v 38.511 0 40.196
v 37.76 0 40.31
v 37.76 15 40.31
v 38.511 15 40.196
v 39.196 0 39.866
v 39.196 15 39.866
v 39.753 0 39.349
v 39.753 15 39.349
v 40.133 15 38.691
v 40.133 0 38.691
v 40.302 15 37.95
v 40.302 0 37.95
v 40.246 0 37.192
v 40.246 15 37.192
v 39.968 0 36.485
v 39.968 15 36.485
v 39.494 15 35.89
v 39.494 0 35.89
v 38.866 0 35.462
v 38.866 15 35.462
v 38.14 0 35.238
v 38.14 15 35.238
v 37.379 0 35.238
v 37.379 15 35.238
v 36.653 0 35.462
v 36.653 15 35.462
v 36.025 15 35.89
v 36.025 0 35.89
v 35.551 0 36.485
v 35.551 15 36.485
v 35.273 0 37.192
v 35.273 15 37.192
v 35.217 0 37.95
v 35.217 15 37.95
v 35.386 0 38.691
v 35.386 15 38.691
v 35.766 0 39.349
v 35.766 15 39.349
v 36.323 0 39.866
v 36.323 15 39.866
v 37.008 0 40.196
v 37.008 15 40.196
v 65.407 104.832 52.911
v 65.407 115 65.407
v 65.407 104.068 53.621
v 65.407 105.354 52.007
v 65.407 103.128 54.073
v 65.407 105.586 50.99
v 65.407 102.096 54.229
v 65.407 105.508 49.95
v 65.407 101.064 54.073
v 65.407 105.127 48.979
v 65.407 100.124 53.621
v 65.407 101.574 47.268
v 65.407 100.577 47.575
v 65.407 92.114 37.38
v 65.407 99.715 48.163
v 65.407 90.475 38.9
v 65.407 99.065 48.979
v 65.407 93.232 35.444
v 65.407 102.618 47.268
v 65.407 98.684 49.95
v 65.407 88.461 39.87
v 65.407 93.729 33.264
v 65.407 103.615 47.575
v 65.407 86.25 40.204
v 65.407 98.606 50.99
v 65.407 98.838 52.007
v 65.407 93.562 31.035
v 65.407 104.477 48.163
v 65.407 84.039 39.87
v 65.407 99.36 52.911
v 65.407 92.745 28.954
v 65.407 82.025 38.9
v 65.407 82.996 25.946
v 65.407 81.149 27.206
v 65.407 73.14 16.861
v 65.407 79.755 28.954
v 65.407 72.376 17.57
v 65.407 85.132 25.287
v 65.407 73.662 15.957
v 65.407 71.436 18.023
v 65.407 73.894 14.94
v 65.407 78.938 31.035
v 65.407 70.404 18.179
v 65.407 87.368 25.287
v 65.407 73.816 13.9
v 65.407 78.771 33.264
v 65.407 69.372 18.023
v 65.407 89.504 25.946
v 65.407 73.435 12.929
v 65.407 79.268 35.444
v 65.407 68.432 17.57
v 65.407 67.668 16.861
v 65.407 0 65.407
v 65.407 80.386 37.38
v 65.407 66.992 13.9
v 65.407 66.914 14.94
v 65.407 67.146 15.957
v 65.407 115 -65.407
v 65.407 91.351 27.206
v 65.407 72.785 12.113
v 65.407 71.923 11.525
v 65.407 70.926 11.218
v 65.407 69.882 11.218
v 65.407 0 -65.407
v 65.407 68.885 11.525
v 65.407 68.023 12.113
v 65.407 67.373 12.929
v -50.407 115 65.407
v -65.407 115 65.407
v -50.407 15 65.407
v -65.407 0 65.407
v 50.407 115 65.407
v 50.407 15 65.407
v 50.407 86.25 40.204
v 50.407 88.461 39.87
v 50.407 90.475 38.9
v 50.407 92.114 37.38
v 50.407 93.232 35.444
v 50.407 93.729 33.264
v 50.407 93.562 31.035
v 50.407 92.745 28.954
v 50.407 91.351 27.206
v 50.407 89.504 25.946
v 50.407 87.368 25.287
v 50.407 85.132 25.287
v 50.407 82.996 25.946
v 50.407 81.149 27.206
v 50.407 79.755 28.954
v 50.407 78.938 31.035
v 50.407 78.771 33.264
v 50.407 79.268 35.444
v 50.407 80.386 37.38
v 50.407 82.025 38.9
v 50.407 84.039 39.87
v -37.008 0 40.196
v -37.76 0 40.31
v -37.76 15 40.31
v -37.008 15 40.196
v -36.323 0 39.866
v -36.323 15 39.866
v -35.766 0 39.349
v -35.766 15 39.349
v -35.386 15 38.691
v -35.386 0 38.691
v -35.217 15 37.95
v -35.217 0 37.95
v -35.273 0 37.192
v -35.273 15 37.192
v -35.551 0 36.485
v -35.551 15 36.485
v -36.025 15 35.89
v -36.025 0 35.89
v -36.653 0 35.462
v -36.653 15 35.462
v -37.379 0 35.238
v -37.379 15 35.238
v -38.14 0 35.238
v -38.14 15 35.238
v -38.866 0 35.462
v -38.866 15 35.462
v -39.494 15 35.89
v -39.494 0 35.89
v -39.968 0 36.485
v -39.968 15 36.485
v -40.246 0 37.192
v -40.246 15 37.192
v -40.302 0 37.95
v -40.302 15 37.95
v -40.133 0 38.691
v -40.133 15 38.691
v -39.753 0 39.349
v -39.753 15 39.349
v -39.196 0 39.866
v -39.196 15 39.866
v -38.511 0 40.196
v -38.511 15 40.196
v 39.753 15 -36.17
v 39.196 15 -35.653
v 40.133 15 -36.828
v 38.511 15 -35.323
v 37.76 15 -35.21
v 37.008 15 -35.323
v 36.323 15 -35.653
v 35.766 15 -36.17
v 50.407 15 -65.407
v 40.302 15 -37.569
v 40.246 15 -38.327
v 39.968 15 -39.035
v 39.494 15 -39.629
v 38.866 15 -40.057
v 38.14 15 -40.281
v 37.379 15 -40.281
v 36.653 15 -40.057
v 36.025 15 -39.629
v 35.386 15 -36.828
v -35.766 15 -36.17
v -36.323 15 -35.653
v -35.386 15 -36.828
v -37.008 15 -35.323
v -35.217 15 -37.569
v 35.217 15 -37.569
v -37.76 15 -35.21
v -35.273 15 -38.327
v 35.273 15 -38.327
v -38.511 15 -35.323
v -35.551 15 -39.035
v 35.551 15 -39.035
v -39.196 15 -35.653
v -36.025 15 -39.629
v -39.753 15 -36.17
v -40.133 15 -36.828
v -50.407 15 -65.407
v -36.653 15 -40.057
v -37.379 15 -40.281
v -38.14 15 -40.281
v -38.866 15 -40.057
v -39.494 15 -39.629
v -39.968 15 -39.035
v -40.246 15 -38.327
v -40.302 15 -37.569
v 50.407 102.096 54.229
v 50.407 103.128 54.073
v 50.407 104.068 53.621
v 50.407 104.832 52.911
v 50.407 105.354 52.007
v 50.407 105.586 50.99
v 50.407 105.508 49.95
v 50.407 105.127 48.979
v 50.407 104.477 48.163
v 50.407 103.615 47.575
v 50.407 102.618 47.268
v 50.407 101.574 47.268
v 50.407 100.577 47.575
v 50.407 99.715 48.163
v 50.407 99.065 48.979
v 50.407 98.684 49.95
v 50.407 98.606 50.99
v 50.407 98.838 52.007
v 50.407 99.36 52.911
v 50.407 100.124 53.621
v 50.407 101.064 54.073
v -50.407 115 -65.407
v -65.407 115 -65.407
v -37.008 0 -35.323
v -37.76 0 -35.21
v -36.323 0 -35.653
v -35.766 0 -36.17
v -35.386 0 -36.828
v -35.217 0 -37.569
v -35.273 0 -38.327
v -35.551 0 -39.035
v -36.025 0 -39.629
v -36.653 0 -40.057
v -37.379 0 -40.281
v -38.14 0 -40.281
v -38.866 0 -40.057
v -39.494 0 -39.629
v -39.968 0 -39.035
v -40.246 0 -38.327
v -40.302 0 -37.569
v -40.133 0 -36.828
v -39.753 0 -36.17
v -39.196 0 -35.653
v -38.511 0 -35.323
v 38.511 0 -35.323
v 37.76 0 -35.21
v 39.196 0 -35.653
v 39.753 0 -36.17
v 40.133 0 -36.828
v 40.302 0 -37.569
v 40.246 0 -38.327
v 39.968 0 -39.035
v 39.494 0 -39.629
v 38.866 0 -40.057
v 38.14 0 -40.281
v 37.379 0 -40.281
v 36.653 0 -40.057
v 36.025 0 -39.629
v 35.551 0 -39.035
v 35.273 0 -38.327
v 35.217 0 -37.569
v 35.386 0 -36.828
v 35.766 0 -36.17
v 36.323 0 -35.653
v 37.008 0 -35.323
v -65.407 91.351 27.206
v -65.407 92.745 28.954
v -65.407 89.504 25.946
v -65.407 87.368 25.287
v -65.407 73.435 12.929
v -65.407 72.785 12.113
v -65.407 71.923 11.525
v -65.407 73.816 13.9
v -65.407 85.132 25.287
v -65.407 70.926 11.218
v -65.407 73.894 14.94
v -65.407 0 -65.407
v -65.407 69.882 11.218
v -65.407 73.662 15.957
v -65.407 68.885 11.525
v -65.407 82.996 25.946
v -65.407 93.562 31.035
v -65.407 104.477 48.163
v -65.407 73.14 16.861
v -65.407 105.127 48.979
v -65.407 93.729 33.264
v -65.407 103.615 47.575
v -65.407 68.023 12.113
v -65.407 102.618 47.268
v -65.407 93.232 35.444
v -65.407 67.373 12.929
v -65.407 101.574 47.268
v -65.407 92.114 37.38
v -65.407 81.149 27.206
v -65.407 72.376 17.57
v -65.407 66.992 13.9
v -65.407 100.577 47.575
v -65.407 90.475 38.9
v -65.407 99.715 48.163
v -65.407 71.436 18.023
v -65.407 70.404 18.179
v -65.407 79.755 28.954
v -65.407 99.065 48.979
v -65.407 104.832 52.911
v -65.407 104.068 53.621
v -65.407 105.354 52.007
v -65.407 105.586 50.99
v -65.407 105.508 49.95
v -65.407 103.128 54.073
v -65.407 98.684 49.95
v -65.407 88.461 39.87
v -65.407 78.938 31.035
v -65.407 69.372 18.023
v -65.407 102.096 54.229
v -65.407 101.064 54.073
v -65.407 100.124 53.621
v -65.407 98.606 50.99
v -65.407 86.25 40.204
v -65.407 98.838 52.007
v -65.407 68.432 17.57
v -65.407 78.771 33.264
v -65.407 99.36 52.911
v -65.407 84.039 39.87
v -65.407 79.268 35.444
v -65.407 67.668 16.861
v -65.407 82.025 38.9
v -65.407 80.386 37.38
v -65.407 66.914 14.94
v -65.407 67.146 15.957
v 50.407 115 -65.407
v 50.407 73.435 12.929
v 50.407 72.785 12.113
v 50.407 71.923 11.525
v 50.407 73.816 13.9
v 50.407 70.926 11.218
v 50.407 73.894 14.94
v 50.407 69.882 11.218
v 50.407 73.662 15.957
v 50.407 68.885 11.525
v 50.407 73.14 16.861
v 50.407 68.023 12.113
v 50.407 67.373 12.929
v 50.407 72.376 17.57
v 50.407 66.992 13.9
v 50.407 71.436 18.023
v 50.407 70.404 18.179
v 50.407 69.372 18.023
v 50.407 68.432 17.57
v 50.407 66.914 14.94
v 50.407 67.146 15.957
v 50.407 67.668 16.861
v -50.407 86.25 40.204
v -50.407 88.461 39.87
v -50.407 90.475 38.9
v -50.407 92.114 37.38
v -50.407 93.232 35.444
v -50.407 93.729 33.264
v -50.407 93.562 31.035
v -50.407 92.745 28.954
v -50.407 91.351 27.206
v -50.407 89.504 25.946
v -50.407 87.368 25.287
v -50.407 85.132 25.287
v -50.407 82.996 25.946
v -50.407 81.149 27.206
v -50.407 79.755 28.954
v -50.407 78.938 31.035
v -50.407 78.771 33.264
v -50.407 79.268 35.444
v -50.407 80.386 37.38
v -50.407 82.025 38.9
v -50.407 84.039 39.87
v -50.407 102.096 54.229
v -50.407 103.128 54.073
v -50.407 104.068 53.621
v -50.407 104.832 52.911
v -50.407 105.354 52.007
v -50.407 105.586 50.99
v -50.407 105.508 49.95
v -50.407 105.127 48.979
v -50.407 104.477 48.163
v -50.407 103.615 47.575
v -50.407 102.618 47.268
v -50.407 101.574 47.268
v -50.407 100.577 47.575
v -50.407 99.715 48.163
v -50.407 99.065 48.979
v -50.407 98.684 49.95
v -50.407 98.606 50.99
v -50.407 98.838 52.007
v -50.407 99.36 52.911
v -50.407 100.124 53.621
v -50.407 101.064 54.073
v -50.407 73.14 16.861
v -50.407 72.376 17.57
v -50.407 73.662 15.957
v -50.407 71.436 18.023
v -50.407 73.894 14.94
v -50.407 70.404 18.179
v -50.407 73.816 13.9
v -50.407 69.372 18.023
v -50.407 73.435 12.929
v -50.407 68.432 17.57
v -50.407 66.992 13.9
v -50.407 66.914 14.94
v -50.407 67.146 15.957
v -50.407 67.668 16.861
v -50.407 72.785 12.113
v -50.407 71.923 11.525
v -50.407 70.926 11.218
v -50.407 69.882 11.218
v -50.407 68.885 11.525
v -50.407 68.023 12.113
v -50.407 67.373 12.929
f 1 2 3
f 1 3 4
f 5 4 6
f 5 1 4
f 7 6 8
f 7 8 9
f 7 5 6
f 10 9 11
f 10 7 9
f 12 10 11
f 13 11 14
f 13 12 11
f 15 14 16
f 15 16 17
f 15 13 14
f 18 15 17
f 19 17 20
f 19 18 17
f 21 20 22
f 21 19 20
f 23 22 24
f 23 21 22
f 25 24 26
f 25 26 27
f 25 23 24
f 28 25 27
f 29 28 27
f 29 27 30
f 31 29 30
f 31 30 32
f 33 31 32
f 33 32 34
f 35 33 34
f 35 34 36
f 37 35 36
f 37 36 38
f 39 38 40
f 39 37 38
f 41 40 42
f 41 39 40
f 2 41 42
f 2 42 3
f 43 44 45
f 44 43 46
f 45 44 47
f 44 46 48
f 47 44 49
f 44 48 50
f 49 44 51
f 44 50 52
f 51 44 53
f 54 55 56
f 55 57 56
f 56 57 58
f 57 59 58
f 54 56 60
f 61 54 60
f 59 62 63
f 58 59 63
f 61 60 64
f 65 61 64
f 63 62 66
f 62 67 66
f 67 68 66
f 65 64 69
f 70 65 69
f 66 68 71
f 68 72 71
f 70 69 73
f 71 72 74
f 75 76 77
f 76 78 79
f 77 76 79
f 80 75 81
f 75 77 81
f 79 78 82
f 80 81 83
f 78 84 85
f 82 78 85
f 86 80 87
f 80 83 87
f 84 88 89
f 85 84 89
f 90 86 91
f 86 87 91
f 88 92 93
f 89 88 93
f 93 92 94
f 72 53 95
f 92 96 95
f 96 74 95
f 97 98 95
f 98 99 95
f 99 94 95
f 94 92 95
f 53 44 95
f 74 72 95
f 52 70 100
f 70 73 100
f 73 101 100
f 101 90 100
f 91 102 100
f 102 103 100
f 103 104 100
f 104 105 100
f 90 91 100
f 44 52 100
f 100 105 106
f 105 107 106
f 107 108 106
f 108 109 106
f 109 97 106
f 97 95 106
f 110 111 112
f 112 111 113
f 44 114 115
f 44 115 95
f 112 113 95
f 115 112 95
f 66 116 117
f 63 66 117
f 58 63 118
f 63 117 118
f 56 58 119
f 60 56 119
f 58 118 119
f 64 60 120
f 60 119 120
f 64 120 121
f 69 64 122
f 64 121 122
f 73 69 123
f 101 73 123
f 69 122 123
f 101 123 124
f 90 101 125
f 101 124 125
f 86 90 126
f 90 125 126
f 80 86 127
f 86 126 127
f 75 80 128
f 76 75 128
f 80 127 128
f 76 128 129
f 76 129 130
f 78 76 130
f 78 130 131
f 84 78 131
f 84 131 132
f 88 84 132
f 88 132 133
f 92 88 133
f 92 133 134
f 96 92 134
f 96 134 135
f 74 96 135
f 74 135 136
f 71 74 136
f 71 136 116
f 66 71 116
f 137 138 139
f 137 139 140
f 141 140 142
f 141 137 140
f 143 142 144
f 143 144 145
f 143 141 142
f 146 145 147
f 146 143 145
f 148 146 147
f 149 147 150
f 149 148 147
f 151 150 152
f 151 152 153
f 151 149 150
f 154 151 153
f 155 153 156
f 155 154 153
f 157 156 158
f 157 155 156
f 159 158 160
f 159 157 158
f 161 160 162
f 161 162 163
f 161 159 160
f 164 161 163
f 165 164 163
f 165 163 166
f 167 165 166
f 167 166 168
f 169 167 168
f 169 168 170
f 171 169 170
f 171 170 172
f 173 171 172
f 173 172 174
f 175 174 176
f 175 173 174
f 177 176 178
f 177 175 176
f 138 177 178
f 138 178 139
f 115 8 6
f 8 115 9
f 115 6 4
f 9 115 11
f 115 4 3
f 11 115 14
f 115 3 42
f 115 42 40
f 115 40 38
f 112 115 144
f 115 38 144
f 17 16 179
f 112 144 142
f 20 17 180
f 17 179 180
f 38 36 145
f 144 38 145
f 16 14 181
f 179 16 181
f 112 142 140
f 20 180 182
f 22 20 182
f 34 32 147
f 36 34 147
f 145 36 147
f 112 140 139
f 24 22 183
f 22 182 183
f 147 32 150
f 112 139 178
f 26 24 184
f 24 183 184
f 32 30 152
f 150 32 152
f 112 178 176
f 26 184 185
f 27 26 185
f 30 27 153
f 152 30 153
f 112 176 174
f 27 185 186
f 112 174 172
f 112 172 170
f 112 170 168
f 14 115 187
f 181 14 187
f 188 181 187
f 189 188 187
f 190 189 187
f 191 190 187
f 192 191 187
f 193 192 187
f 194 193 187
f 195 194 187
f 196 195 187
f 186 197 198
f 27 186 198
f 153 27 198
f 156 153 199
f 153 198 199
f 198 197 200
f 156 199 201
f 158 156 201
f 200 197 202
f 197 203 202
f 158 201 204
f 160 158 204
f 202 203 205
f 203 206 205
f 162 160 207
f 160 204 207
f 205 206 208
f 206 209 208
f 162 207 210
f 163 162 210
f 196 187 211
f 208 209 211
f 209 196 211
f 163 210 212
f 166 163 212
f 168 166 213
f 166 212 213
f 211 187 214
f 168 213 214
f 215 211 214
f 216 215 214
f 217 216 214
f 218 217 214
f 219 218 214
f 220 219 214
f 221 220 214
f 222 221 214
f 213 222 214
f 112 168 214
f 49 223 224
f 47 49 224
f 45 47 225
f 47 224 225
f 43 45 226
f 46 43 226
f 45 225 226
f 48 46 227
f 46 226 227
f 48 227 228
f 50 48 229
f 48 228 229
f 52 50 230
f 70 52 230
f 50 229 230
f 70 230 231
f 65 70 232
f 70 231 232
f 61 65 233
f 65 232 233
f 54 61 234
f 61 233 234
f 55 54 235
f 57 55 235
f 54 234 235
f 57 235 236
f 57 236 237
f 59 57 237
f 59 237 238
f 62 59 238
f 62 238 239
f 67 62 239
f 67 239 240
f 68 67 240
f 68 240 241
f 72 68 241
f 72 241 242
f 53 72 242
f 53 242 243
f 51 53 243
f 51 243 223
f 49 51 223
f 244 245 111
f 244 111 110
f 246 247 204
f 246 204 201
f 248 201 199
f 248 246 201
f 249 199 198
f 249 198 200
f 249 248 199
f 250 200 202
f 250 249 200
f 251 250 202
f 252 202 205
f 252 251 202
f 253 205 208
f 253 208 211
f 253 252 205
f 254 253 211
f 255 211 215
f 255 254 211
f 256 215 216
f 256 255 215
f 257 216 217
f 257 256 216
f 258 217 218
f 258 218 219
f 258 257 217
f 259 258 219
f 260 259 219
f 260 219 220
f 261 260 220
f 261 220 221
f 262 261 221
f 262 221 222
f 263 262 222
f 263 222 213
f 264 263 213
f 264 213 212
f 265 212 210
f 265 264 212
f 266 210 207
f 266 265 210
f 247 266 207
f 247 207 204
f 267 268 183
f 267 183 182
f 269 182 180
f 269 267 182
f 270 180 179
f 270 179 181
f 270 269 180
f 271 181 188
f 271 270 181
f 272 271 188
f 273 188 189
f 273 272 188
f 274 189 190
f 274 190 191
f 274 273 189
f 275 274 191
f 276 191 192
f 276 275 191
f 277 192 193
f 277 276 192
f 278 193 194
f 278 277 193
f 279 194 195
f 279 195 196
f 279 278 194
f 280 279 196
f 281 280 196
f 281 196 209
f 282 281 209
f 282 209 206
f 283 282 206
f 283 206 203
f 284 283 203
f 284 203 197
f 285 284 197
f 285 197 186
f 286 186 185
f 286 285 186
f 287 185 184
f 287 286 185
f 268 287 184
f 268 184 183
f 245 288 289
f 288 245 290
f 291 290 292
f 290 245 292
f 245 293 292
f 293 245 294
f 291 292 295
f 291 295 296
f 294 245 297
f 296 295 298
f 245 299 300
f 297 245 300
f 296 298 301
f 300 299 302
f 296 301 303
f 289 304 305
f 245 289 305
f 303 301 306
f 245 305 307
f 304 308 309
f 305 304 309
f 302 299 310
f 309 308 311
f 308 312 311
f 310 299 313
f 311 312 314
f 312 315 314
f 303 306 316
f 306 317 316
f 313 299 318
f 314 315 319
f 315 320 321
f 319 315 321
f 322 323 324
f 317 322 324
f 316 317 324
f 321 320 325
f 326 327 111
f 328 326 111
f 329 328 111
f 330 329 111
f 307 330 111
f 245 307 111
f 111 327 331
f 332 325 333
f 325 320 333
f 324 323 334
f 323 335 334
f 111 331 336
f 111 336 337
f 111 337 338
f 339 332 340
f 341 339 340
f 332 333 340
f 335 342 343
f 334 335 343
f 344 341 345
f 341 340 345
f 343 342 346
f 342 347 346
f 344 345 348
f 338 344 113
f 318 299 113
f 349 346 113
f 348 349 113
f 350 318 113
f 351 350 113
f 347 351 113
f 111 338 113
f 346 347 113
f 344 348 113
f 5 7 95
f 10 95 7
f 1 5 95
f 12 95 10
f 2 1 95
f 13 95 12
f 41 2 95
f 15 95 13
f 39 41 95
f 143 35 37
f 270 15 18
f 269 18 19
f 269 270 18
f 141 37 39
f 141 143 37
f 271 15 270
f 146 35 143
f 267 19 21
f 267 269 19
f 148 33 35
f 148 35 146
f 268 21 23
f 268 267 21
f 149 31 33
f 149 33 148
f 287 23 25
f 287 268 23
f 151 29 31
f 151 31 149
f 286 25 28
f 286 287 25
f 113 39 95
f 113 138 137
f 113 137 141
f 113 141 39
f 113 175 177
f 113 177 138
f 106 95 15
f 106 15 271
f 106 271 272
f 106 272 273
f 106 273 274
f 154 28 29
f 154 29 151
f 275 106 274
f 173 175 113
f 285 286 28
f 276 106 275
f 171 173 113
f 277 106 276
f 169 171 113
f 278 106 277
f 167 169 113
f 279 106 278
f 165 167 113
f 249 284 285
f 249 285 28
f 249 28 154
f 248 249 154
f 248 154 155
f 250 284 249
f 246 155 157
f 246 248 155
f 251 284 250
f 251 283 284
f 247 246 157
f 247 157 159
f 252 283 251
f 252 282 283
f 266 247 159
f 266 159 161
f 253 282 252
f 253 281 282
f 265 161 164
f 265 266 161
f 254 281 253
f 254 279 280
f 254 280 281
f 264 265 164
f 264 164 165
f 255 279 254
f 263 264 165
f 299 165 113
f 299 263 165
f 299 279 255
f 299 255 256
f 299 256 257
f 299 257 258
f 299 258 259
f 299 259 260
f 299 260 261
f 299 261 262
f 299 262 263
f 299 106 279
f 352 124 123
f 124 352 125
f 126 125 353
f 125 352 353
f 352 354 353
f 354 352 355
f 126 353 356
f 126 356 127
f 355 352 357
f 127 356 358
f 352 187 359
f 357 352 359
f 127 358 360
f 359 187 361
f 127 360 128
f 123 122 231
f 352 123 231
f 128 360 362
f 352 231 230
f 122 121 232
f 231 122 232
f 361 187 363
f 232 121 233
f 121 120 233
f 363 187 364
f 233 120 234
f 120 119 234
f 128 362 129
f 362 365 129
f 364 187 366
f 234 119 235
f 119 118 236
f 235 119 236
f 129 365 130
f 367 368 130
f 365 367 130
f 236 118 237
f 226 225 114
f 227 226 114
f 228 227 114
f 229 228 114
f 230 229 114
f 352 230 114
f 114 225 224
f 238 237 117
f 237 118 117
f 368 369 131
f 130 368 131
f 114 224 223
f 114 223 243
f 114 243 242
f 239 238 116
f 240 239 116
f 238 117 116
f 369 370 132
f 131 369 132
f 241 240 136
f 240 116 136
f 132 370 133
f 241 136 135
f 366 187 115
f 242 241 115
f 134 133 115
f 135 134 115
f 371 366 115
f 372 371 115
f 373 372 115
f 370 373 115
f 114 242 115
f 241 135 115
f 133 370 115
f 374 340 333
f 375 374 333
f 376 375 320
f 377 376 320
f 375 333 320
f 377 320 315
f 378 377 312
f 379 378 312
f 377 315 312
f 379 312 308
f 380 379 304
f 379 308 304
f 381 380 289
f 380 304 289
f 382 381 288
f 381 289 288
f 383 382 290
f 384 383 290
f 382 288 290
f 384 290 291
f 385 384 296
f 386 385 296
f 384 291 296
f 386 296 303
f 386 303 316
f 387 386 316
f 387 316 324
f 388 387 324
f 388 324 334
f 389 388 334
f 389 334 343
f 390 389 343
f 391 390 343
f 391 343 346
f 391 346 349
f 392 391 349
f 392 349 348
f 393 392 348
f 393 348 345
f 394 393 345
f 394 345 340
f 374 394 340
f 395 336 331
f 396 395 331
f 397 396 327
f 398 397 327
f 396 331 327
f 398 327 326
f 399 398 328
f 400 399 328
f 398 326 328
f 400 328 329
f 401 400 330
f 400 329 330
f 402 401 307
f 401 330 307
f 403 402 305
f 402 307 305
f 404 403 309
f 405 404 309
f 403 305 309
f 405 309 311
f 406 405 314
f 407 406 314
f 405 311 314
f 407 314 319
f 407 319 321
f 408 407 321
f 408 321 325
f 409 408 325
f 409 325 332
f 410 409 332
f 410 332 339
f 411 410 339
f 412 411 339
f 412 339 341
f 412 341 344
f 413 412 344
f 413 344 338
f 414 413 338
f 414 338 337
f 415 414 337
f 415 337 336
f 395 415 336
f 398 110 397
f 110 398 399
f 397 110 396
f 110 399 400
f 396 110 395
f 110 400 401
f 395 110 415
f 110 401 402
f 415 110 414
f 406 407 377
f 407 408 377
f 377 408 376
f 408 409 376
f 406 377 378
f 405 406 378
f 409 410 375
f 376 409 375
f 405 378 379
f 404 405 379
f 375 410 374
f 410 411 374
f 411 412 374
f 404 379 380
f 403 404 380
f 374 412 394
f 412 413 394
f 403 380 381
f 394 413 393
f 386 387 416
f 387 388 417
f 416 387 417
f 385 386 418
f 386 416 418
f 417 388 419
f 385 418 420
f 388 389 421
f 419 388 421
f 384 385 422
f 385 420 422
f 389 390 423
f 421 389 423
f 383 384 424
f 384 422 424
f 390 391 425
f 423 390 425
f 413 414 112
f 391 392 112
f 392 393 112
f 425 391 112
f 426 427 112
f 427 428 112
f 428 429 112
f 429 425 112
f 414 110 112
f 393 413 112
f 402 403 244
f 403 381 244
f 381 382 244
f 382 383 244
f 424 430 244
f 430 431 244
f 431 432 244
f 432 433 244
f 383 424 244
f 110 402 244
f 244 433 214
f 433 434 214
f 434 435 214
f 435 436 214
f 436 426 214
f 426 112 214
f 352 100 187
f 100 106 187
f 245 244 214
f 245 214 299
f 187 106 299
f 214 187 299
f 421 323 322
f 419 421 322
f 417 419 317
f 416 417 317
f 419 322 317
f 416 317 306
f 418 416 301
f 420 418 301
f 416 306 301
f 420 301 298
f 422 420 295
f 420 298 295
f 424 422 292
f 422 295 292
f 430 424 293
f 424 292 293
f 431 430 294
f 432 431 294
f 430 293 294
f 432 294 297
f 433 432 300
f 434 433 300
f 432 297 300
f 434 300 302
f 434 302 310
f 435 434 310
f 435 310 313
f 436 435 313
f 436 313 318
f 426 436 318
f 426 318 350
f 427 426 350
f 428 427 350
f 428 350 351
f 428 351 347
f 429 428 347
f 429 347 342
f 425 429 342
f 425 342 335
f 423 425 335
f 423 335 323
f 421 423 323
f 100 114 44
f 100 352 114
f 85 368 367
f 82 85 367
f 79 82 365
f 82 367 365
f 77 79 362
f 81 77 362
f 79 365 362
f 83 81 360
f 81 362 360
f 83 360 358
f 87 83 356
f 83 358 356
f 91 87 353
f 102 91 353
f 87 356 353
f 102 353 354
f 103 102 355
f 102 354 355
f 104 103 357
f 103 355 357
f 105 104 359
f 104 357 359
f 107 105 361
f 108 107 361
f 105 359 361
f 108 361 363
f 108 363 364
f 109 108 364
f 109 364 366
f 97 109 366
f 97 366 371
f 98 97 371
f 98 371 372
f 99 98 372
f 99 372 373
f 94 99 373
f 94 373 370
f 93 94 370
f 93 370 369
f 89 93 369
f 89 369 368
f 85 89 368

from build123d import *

# Parameters (mm, degrees)
SKETCH1_R           = 2.55
BOSS_EXTRUDE1_DEPTH = 15
BOSS_EXTRUDE2_DEPTH = 100
CUT_EXTRUDE1_REACH  = 188.053
SKETCH3_R           = 7.5
SKETCH3_R_2         = 3.5


with BuildPart() as part:
    # Sketch1 → Boss-Extrude1 (new body)
    with BuildSketch(Plane(origin=(0, 0, 0), x_dir=(1, 0, 0), z_dir=(0, 1, 0))):
        Polygon((-65.40737726, 35.40737726), (-65.40737726, 65.40737726), (-35.40737726, 65.40737726), (35.40737726, 65.40737726), (65.40737726, 65.40737726), (65.40737726, 35.40737726), (65.40737726, -35.40737726), (65.40737726, -65.40737726), (35.40737726, -65.40737726), (-35.40737726, -65.40737726), (-65.40737726, -65.40737726), (-65.40737726, -35.40737726), align=None)
        with Locations(Location((37.759502115, 37.759502115, 0), (0, 0, 270))):
            Circle(SKETCH1_R, mode=Mode.SUBTRACT)
        with Locations(Location((37.759502115, -37.759502115, 0), (0, 0, 270))):
            Circle(SKETCH1_R, mode=Mode.SUBTRACT)
        with Locations(Location((-37.759502115, -37.759502115, 0), (0, 0, 270))):
            Circle(SKETCH1_R, mode=Mode.SUBTRACT)
        with Locations(Location((-37.759502115, 37.759502115, 0), (0, 0, 270))):
            Circle(SKETCH1_R, mode=Mode.SUBTRACT)
    extrude(amount=BOSS_EXTRUDE1_DEPTH)

    # Sketch2 → Boss-Extrude2 (add)
    with BuildSketch(Plane(origin=(0, 15, 0), x_dir=(1, 0, 0), z_dir=(0, 1, 0))):
        Polygon((50.40737726, -50.40737726), (50.40737726, -65.40737726), (65.40737726, -65.40737726), (65.40737726, 65.40737726), (50.40737726, 65.40737726), (50.40737726, 50.40737726), align=None)
        Polygon((-65.40737726, 65.40737726), (-65.40737726, -65.40737726), (-50.40737726, -65.40737726), (-50.40737726, -50.40737726), (-50.40737726, 50.40737726), (-50.40737726, 65.40737726), align=None)
    extrude(amount=BOSS_EXTRUDE2_DEPTH)

    # Cut-Extrude1: up to this face of the body (flat: up to its plane)
    cut_extrude1_end = Plane(part.part.faces().sort_by_distance((65.40737726, 57.5, 0))[0])
    # Sketch3 → Cut-Extrude1 (cut, up to the picked face)
    with BuildSketch(Plane.ZY.offset(65.40737726), mode=Mode.PRIVATE) as cut_extrude1_sk1:
        with Locations((32.70368863, 86.25)):
            Circle(SKETCH3_R)
    cut_extrude1_tool1 = split(extrude(cut_extrude1_sk1.sketch, amount=-CUT_EXTRUDE1_REACH, mode=Mode.PRIVATE), bisect_by=cut_extrude1_end, keep=Keep.BOTH, mode=Mode.PRIVATE)
    # Sketch3 → Cut-Extrude1 (cut, up to the picked face)
    with BuildSketch(Plane.ZY.offset(65.40737726), mode=Mode.PRIVATE) as cut_extrude1_sk2:
        with Locations((14.678572243, 70.404016937)):
            Circle(SKETCH3_R_2)
    cut_extrude1_tool2 = split(extrude(cut_extrude1_sk2.sketch, amount=-CUT_EXTRUDE1_REACH, mode=Mode.PRIVATE), bisect_by=cut_extrude1_end, keep=Keep.BOTH, mode=Mode.PRIVATE)
    # Sketch3 → Cut-Extrude1 (cut, up to the picked face)
    with BuildSketch(Plane.ZY.offset(65.40737726), mode=Mode.PRIVATE) as cut_extrude1_sk3:
        with Locations((50.728805017, 102.095983063)):
            Circle(SKETCH3_R_2)
    cut_extrude1_tool3 = split(extrude(cut_extrude1_sk3.sketch, amount=-CUT_EXTRUDE1_REACH, mode=Mode.PRIVATE), bisect_by=cut_extrude1_end, keep=Keep.BOTH, mode=Mode.PRIVATE)
    add(cut_extrude1_tool1.solids().sort_by(Axis((-65.407377, 86.25, 32.703689), (1, 0, 0)))[0], mode=Mode.SUBTRACT)
    add(cut_extrude1_tool2.solids().sort_by(Axis((-65.407377, 70.404017, 14.678572), (1, 0, 0)))[0], mode=Mode.SUBTRACT)
    add(cut_extrude1_tool3.solids().sort_by(Axis((-65.407377, 102.095983, 50.728805), (1, 0, 0)))[0], mode=Mode.SUBTRACT)


solid = part.part
